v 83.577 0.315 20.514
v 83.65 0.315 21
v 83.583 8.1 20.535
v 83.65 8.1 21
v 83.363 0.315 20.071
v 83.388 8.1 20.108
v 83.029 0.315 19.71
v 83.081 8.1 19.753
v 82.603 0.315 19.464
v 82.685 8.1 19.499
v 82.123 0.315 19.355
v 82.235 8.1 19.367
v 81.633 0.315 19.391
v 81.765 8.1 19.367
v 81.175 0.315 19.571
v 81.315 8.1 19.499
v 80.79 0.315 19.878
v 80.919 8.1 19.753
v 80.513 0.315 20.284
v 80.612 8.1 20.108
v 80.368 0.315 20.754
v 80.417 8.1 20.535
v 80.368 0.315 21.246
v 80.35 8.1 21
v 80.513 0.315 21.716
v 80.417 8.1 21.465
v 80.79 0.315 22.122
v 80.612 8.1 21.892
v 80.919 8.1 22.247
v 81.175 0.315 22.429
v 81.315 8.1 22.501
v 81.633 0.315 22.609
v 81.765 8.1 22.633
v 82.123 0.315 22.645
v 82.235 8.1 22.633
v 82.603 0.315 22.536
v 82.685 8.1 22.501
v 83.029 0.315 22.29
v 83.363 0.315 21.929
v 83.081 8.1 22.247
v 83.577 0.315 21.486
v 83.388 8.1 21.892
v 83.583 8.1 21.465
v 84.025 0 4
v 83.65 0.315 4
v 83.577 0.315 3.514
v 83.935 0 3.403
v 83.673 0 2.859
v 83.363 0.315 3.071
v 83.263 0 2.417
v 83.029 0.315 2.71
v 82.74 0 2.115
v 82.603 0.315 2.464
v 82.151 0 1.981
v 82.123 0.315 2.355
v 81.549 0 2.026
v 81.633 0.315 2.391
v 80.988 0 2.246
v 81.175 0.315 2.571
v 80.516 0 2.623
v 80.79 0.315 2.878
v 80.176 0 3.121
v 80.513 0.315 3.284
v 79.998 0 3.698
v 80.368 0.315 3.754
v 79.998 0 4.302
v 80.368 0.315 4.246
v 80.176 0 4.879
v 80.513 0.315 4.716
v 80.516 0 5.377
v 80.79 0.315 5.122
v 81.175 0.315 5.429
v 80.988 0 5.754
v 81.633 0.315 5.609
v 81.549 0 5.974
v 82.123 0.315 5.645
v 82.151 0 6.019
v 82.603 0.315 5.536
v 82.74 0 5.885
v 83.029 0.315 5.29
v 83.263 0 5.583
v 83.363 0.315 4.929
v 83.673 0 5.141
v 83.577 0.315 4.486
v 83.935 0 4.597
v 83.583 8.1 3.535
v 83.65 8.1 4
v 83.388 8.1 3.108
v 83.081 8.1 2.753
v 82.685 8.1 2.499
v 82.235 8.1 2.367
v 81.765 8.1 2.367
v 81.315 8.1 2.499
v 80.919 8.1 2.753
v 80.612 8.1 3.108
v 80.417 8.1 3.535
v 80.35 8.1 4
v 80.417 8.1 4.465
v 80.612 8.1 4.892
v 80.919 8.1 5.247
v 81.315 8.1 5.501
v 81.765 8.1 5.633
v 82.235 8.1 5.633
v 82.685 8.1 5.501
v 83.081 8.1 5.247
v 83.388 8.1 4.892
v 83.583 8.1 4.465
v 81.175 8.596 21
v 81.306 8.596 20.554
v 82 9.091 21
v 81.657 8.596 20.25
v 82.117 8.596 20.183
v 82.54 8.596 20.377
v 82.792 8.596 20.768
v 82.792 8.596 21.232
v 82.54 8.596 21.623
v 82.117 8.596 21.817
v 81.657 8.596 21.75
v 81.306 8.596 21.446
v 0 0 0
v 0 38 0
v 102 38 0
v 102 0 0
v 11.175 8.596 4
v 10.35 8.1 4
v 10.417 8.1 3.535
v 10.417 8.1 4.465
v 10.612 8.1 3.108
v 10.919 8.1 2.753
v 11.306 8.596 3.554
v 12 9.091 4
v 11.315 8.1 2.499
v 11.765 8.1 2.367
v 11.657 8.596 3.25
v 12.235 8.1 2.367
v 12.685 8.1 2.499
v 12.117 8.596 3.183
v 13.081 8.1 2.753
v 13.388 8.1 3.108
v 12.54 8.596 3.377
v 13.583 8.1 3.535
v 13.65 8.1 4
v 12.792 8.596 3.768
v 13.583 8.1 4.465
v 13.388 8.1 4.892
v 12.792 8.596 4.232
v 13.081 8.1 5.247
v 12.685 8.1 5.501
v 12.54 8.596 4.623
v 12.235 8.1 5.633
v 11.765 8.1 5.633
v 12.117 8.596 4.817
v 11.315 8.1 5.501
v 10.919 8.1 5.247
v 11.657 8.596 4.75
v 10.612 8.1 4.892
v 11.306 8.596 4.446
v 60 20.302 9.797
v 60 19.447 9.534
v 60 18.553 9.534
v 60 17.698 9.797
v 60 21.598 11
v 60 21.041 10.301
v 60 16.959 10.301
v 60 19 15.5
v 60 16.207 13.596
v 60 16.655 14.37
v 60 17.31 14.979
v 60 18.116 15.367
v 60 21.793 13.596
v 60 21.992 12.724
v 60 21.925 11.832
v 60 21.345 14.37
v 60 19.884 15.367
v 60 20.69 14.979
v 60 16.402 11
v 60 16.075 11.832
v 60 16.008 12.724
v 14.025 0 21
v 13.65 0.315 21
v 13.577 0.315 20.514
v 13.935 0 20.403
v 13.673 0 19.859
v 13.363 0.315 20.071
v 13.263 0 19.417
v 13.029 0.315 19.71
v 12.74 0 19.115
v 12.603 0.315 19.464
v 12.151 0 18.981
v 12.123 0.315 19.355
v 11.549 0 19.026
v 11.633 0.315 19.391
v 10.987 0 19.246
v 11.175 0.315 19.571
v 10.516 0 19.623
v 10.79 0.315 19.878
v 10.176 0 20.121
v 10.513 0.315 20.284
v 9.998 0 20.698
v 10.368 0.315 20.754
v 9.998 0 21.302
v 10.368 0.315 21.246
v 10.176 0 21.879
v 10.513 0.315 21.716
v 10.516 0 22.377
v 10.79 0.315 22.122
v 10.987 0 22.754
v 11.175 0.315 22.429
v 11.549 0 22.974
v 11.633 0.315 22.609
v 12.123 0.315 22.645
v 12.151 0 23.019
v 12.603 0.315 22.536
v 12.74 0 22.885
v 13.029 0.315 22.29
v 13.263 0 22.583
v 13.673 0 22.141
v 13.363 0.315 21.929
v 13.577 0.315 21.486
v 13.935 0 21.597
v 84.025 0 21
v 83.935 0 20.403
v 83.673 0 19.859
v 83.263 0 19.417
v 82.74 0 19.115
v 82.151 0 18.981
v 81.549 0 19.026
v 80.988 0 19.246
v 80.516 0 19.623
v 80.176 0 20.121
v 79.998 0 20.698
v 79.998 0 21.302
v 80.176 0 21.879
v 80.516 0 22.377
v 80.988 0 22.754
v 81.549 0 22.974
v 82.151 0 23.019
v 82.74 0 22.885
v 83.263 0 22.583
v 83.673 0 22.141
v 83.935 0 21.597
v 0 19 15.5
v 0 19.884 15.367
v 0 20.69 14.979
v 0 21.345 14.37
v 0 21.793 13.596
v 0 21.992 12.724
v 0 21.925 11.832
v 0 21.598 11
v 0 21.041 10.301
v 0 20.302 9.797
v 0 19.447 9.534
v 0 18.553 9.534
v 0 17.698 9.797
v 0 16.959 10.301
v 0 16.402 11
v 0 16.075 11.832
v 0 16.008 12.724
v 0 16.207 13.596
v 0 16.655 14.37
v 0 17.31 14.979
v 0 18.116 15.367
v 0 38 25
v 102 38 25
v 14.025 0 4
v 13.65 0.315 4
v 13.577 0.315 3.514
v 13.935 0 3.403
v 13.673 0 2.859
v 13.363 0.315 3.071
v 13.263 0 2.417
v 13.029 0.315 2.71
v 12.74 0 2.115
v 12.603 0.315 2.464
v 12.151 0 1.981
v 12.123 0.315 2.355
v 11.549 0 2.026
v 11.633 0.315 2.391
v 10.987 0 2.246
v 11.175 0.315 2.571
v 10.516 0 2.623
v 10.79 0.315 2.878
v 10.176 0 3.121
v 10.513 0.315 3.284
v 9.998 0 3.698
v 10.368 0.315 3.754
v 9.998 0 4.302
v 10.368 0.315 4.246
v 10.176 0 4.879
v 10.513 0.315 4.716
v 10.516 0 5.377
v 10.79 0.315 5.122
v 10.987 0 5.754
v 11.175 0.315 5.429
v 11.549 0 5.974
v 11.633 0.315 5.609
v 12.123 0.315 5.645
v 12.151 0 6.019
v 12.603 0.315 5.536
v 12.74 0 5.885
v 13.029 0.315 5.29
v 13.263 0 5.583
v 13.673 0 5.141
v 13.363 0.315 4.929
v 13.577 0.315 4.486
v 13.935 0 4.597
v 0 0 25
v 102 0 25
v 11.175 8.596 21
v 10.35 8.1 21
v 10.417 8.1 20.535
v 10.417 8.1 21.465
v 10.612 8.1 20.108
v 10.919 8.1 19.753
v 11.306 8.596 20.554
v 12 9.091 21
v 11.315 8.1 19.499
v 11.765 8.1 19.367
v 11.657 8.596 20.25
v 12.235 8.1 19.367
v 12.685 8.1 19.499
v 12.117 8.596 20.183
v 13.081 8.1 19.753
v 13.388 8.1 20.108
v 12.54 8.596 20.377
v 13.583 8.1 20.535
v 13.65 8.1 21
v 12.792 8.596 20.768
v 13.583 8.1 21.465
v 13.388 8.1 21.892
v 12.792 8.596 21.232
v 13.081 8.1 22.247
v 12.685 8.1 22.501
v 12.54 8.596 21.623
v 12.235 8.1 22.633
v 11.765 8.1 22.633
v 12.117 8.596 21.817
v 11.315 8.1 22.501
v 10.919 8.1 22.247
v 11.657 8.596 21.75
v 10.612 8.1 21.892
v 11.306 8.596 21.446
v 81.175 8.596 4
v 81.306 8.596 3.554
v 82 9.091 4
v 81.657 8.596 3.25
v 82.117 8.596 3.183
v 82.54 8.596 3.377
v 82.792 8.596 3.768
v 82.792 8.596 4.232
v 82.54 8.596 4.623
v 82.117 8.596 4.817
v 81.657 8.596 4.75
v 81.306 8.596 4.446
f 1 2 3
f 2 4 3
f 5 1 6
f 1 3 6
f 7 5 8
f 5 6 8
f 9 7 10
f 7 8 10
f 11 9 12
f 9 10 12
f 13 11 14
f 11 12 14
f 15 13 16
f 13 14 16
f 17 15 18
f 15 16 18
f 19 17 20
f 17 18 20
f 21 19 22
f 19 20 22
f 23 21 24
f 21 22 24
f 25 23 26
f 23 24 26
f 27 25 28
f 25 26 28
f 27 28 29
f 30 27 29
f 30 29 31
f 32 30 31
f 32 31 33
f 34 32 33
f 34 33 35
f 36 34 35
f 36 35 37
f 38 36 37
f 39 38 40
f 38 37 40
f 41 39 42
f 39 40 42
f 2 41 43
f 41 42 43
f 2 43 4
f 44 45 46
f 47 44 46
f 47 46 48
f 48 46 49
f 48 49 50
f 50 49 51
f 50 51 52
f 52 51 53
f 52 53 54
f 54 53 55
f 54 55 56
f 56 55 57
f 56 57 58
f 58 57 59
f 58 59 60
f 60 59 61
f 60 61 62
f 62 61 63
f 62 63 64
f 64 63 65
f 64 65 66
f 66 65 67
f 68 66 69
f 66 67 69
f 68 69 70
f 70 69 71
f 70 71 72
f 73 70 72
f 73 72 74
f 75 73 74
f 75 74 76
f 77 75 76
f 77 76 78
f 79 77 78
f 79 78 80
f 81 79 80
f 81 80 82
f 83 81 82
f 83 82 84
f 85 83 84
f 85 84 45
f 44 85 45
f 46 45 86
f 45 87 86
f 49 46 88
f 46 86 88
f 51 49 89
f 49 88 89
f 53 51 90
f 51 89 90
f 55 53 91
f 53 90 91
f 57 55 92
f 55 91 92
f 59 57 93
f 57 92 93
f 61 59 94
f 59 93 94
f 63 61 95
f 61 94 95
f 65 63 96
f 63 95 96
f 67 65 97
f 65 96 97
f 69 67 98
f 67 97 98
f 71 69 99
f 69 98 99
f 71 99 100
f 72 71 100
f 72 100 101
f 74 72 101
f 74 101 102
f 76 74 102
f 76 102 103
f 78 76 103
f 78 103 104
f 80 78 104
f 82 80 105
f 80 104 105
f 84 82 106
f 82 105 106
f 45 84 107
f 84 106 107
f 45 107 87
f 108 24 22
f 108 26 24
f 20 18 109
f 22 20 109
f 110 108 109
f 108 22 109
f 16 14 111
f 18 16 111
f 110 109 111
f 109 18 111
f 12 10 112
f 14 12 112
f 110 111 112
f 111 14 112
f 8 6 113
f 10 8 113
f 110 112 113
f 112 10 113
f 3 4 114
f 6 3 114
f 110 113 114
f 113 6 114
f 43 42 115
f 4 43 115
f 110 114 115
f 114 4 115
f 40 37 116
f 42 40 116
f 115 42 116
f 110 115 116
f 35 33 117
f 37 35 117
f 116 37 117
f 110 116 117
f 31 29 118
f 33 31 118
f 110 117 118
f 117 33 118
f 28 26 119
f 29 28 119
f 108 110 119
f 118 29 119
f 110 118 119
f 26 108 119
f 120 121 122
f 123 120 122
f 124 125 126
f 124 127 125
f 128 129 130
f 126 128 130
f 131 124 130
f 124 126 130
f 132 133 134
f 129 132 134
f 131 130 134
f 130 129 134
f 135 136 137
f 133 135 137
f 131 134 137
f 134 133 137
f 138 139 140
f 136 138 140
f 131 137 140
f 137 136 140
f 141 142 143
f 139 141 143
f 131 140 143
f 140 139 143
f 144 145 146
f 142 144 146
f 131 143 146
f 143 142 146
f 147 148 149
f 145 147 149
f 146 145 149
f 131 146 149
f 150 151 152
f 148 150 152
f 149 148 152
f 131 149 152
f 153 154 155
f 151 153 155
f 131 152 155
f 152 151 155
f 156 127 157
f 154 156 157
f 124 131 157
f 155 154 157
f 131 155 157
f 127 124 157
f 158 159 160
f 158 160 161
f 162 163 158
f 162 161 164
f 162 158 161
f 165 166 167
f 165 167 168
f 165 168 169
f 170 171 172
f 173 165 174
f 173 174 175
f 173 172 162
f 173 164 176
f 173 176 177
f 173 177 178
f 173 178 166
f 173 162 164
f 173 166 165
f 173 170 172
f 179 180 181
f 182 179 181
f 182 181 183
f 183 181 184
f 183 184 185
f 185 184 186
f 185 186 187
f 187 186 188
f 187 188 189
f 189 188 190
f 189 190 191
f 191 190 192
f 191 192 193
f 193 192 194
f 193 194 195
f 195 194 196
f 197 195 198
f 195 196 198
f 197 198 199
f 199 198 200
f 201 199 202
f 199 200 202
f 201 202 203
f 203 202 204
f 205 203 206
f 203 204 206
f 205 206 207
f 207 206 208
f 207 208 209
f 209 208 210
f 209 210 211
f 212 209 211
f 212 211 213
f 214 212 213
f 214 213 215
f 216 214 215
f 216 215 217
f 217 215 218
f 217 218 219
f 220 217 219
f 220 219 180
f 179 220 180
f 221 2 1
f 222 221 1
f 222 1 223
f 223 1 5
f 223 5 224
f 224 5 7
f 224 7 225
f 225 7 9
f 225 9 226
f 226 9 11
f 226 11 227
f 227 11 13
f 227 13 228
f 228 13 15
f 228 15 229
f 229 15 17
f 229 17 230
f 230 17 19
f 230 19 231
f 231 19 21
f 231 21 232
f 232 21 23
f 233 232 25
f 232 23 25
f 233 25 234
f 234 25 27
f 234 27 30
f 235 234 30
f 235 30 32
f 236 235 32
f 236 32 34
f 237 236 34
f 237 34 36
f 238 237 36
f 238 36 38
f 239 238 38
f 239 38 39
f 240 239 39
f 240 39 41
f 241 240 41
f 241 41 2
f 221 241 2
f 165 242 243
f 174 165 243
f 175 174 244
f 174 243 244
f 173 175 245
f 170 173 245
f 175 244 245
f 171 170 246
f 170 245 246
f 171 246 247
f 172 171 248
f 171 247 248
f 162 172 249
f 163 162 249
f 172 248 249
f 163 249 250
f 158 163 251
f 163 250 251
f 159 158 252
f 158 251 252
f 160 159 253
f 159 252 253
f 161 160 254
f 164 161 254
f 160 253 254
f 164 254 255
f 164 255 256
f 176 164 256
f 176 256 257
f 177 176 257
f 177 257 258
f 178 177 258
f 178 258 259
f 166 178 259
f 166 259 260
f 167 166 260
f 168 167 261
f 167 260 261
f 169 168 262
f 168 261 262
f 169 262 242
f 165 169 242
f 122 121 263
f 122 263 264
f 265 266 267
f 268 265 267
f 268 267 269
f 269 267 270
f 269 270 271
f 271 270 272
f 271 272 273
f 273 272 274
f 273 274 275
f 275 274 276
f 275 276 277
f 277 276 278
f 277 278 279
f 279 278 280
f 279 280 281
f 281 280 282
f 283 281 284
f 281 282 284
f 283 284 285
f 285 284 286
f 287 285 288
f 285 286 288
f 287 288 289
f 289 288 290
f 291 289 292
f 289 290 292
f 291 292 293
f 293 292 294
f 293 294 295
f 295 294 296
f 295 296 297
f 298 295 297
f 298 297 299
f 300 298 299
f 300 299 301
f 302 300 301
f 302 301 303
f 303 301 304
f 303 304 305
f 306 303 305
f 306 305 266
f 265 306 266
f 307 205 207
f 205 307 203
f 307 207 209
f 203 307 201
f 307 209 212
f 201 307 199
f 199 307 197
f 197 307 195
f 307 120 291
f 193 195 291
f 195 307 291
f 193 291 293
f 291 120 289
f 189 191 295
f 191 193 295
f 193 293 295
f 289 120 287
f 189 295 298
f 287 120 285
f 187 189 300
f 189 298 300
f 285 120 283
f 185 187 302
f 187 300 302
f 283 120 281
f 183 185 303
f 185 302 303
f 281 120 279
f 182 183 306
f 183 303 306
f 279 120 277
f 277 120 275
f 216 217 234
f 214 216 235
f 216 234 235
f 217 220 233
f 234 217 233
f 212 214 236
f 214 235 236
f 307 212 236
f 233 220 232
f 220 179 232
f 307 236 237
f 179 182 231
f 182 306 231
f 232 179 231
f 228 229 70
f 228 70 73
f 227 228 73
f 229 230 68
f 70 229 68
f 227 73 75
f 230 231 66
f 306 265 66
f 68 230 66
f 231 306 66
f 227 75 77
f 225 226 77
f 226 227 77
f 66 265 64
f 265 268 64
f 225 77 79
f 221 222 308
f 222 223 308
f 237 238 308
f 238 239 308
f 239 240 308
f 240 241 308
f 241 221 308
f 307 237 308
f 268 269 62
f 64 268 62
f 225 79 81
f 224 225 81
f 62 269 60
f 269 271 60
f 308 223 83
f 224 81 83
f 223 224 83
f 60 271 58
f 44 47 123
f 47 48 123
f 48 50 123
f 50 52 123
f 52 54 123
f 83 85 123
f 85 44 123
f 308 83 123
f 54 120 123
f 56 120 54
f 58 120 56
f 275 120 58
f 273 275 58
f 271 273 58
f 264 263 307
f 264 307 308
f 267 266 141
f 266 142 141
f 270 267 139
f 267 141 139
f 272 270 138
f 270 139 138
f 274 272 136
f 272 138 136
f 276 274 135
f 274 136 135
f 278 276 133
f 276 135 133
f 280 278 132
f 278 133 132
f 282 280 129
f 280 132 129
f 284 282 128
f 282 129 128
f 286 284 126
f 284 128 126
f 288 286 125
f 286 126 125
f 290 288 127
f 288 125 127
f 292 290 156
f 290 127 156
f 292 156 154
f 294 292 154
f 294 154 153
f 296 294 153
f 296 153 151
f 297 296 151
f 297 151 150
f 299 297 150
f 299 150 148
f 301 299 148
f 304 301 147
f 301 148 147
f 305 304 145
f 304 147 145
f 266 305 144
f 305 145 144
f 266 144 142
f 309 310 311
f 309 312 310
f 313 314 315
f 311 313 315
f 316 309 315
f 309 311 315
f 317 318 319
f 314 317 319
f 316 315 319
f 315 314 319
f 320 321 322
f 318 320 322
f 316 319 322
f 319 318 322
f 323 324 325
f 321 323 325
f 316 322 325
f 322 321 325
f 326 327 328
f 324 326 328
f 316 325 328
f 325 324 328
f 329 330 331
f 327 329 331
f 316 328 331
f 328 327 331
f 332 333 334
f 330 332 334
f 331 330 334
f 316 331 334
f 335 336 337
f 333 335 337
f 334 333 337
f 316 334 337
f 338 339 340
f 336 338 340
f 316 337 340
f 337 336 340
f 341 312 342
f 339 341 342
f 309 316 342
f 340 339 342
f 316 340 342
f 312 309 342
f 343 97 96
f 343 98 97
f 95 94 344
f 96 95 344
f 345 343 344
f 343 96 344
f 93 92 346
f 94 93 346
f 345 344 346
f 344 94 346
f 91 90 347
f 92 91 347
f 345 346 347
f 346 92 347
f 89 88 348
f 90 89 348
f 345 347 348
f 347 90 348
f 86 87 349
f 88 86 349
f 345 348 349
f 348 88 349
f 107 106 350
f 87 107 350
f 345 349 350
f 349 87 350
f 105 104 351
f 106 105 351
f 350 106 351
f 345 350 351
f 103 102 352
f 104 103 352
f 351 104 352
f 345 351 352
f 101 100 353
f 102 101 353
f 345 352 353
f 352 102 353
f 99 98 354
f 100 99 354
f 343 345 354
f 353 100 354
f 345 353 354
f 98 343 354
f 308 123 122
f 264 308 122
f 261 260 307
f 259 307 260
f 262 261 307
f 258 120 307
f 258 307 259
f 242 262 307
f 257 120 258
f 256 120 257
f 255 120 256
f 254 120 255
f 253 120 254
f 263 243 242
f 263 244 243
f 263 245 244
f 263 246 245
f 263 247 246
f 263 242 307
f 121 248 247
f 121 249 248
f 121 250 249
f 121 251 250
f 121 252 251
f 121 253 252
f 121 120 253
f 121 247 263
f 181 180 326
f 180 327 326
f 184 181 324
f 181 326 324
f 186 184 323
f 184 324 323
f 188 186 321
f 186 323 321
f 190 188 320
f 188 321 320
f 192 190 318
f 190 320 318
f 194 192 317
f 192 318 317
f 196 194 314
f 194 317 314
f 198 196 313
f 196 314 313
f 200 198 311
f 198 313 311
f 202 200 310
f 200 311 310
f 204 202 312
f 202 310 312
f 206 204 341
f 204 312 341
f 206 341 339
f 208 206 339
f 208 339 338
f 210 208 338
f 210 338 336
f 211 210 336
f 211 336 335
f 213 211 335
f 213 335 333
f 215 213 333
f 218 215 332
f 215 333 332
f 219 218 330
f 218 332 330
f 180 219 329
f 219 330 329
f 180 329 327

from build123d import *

# Parameters (mm, degrees)
SKETCH1_W                       = 102
SKETCH1_H                       = 38
BOSS_EXTRUDE1_DEPTH             = 25
SKETCH2_R                       = 3
CUT_EXTRUDE1_DEPTH              = 60
M4X0_7_TAPPED_HOLE1_D           = 3.3
M4X0_7_TAPPED_HOLE1_DEPTH       = 8.1
M4X0_7_TAPPED_HOLE1_CSINK_D     = 4.05
M4X0_7_TAPPED_HOLE1_CSINK_ANGLE = 100
M4X0_7_TAPPED_HOLE1_TIP         = 0.991420021


with BuildPart() as part:
    # Sketch1 → Boss-Extrude1 (new body)
    with BuildSketch(Plane.XY):
        with Locations((51, 19)):
            Rectangle(SKETCH1_W, SKETCH1_H)
    extrude(amount=BOSS_EXTRUDE1_DEPTH)

    # Sketch2 → Cut-Extrude1 (cut)
    with BuildSketch(Plane.ZY):
        with Locations((12.5, 19)):
            Circle(SKETCH2_R)
    extrude(amount=-CUT_EXTRUDE1_DEPTH, mode=Mode.SUBTRACT)

    # M4x0.7 Tapped Hole1
    with Locations(Plane(origin=(0, 0, 0), x_dir=(-1, 0, 0), z_dir=(0, -1, 0))):
        with Locations((-82, -4), (-12, -4), (-12, -21), (-82, -21)):
            CounterSinkHole(M4X0_7_TAPPED_HOLE1_D / 2, M4X0_7_TAPPED_HOLE1_CSINK_D / 2, depth=M4X0_7_TAPPED_HOLE1_DEPTH, counter_sink_angle=M4X0_7_TAPPED_HOLE1_CSINK_ANGLE)
            with Locations((0, 0, -(M4X0_7_TAPPED_HOLE1_DEPTH + M4X0_7_TAPPED_HOLE1_TIP / 2))):  # 118° drill point
                Cone(0, M4X0_7_TAPPED_HOLE1_D / 2, M4X0_7_TAPPED_HOLE1_TIP, mode=Mode.SUBTRACT)


solid = part.part
